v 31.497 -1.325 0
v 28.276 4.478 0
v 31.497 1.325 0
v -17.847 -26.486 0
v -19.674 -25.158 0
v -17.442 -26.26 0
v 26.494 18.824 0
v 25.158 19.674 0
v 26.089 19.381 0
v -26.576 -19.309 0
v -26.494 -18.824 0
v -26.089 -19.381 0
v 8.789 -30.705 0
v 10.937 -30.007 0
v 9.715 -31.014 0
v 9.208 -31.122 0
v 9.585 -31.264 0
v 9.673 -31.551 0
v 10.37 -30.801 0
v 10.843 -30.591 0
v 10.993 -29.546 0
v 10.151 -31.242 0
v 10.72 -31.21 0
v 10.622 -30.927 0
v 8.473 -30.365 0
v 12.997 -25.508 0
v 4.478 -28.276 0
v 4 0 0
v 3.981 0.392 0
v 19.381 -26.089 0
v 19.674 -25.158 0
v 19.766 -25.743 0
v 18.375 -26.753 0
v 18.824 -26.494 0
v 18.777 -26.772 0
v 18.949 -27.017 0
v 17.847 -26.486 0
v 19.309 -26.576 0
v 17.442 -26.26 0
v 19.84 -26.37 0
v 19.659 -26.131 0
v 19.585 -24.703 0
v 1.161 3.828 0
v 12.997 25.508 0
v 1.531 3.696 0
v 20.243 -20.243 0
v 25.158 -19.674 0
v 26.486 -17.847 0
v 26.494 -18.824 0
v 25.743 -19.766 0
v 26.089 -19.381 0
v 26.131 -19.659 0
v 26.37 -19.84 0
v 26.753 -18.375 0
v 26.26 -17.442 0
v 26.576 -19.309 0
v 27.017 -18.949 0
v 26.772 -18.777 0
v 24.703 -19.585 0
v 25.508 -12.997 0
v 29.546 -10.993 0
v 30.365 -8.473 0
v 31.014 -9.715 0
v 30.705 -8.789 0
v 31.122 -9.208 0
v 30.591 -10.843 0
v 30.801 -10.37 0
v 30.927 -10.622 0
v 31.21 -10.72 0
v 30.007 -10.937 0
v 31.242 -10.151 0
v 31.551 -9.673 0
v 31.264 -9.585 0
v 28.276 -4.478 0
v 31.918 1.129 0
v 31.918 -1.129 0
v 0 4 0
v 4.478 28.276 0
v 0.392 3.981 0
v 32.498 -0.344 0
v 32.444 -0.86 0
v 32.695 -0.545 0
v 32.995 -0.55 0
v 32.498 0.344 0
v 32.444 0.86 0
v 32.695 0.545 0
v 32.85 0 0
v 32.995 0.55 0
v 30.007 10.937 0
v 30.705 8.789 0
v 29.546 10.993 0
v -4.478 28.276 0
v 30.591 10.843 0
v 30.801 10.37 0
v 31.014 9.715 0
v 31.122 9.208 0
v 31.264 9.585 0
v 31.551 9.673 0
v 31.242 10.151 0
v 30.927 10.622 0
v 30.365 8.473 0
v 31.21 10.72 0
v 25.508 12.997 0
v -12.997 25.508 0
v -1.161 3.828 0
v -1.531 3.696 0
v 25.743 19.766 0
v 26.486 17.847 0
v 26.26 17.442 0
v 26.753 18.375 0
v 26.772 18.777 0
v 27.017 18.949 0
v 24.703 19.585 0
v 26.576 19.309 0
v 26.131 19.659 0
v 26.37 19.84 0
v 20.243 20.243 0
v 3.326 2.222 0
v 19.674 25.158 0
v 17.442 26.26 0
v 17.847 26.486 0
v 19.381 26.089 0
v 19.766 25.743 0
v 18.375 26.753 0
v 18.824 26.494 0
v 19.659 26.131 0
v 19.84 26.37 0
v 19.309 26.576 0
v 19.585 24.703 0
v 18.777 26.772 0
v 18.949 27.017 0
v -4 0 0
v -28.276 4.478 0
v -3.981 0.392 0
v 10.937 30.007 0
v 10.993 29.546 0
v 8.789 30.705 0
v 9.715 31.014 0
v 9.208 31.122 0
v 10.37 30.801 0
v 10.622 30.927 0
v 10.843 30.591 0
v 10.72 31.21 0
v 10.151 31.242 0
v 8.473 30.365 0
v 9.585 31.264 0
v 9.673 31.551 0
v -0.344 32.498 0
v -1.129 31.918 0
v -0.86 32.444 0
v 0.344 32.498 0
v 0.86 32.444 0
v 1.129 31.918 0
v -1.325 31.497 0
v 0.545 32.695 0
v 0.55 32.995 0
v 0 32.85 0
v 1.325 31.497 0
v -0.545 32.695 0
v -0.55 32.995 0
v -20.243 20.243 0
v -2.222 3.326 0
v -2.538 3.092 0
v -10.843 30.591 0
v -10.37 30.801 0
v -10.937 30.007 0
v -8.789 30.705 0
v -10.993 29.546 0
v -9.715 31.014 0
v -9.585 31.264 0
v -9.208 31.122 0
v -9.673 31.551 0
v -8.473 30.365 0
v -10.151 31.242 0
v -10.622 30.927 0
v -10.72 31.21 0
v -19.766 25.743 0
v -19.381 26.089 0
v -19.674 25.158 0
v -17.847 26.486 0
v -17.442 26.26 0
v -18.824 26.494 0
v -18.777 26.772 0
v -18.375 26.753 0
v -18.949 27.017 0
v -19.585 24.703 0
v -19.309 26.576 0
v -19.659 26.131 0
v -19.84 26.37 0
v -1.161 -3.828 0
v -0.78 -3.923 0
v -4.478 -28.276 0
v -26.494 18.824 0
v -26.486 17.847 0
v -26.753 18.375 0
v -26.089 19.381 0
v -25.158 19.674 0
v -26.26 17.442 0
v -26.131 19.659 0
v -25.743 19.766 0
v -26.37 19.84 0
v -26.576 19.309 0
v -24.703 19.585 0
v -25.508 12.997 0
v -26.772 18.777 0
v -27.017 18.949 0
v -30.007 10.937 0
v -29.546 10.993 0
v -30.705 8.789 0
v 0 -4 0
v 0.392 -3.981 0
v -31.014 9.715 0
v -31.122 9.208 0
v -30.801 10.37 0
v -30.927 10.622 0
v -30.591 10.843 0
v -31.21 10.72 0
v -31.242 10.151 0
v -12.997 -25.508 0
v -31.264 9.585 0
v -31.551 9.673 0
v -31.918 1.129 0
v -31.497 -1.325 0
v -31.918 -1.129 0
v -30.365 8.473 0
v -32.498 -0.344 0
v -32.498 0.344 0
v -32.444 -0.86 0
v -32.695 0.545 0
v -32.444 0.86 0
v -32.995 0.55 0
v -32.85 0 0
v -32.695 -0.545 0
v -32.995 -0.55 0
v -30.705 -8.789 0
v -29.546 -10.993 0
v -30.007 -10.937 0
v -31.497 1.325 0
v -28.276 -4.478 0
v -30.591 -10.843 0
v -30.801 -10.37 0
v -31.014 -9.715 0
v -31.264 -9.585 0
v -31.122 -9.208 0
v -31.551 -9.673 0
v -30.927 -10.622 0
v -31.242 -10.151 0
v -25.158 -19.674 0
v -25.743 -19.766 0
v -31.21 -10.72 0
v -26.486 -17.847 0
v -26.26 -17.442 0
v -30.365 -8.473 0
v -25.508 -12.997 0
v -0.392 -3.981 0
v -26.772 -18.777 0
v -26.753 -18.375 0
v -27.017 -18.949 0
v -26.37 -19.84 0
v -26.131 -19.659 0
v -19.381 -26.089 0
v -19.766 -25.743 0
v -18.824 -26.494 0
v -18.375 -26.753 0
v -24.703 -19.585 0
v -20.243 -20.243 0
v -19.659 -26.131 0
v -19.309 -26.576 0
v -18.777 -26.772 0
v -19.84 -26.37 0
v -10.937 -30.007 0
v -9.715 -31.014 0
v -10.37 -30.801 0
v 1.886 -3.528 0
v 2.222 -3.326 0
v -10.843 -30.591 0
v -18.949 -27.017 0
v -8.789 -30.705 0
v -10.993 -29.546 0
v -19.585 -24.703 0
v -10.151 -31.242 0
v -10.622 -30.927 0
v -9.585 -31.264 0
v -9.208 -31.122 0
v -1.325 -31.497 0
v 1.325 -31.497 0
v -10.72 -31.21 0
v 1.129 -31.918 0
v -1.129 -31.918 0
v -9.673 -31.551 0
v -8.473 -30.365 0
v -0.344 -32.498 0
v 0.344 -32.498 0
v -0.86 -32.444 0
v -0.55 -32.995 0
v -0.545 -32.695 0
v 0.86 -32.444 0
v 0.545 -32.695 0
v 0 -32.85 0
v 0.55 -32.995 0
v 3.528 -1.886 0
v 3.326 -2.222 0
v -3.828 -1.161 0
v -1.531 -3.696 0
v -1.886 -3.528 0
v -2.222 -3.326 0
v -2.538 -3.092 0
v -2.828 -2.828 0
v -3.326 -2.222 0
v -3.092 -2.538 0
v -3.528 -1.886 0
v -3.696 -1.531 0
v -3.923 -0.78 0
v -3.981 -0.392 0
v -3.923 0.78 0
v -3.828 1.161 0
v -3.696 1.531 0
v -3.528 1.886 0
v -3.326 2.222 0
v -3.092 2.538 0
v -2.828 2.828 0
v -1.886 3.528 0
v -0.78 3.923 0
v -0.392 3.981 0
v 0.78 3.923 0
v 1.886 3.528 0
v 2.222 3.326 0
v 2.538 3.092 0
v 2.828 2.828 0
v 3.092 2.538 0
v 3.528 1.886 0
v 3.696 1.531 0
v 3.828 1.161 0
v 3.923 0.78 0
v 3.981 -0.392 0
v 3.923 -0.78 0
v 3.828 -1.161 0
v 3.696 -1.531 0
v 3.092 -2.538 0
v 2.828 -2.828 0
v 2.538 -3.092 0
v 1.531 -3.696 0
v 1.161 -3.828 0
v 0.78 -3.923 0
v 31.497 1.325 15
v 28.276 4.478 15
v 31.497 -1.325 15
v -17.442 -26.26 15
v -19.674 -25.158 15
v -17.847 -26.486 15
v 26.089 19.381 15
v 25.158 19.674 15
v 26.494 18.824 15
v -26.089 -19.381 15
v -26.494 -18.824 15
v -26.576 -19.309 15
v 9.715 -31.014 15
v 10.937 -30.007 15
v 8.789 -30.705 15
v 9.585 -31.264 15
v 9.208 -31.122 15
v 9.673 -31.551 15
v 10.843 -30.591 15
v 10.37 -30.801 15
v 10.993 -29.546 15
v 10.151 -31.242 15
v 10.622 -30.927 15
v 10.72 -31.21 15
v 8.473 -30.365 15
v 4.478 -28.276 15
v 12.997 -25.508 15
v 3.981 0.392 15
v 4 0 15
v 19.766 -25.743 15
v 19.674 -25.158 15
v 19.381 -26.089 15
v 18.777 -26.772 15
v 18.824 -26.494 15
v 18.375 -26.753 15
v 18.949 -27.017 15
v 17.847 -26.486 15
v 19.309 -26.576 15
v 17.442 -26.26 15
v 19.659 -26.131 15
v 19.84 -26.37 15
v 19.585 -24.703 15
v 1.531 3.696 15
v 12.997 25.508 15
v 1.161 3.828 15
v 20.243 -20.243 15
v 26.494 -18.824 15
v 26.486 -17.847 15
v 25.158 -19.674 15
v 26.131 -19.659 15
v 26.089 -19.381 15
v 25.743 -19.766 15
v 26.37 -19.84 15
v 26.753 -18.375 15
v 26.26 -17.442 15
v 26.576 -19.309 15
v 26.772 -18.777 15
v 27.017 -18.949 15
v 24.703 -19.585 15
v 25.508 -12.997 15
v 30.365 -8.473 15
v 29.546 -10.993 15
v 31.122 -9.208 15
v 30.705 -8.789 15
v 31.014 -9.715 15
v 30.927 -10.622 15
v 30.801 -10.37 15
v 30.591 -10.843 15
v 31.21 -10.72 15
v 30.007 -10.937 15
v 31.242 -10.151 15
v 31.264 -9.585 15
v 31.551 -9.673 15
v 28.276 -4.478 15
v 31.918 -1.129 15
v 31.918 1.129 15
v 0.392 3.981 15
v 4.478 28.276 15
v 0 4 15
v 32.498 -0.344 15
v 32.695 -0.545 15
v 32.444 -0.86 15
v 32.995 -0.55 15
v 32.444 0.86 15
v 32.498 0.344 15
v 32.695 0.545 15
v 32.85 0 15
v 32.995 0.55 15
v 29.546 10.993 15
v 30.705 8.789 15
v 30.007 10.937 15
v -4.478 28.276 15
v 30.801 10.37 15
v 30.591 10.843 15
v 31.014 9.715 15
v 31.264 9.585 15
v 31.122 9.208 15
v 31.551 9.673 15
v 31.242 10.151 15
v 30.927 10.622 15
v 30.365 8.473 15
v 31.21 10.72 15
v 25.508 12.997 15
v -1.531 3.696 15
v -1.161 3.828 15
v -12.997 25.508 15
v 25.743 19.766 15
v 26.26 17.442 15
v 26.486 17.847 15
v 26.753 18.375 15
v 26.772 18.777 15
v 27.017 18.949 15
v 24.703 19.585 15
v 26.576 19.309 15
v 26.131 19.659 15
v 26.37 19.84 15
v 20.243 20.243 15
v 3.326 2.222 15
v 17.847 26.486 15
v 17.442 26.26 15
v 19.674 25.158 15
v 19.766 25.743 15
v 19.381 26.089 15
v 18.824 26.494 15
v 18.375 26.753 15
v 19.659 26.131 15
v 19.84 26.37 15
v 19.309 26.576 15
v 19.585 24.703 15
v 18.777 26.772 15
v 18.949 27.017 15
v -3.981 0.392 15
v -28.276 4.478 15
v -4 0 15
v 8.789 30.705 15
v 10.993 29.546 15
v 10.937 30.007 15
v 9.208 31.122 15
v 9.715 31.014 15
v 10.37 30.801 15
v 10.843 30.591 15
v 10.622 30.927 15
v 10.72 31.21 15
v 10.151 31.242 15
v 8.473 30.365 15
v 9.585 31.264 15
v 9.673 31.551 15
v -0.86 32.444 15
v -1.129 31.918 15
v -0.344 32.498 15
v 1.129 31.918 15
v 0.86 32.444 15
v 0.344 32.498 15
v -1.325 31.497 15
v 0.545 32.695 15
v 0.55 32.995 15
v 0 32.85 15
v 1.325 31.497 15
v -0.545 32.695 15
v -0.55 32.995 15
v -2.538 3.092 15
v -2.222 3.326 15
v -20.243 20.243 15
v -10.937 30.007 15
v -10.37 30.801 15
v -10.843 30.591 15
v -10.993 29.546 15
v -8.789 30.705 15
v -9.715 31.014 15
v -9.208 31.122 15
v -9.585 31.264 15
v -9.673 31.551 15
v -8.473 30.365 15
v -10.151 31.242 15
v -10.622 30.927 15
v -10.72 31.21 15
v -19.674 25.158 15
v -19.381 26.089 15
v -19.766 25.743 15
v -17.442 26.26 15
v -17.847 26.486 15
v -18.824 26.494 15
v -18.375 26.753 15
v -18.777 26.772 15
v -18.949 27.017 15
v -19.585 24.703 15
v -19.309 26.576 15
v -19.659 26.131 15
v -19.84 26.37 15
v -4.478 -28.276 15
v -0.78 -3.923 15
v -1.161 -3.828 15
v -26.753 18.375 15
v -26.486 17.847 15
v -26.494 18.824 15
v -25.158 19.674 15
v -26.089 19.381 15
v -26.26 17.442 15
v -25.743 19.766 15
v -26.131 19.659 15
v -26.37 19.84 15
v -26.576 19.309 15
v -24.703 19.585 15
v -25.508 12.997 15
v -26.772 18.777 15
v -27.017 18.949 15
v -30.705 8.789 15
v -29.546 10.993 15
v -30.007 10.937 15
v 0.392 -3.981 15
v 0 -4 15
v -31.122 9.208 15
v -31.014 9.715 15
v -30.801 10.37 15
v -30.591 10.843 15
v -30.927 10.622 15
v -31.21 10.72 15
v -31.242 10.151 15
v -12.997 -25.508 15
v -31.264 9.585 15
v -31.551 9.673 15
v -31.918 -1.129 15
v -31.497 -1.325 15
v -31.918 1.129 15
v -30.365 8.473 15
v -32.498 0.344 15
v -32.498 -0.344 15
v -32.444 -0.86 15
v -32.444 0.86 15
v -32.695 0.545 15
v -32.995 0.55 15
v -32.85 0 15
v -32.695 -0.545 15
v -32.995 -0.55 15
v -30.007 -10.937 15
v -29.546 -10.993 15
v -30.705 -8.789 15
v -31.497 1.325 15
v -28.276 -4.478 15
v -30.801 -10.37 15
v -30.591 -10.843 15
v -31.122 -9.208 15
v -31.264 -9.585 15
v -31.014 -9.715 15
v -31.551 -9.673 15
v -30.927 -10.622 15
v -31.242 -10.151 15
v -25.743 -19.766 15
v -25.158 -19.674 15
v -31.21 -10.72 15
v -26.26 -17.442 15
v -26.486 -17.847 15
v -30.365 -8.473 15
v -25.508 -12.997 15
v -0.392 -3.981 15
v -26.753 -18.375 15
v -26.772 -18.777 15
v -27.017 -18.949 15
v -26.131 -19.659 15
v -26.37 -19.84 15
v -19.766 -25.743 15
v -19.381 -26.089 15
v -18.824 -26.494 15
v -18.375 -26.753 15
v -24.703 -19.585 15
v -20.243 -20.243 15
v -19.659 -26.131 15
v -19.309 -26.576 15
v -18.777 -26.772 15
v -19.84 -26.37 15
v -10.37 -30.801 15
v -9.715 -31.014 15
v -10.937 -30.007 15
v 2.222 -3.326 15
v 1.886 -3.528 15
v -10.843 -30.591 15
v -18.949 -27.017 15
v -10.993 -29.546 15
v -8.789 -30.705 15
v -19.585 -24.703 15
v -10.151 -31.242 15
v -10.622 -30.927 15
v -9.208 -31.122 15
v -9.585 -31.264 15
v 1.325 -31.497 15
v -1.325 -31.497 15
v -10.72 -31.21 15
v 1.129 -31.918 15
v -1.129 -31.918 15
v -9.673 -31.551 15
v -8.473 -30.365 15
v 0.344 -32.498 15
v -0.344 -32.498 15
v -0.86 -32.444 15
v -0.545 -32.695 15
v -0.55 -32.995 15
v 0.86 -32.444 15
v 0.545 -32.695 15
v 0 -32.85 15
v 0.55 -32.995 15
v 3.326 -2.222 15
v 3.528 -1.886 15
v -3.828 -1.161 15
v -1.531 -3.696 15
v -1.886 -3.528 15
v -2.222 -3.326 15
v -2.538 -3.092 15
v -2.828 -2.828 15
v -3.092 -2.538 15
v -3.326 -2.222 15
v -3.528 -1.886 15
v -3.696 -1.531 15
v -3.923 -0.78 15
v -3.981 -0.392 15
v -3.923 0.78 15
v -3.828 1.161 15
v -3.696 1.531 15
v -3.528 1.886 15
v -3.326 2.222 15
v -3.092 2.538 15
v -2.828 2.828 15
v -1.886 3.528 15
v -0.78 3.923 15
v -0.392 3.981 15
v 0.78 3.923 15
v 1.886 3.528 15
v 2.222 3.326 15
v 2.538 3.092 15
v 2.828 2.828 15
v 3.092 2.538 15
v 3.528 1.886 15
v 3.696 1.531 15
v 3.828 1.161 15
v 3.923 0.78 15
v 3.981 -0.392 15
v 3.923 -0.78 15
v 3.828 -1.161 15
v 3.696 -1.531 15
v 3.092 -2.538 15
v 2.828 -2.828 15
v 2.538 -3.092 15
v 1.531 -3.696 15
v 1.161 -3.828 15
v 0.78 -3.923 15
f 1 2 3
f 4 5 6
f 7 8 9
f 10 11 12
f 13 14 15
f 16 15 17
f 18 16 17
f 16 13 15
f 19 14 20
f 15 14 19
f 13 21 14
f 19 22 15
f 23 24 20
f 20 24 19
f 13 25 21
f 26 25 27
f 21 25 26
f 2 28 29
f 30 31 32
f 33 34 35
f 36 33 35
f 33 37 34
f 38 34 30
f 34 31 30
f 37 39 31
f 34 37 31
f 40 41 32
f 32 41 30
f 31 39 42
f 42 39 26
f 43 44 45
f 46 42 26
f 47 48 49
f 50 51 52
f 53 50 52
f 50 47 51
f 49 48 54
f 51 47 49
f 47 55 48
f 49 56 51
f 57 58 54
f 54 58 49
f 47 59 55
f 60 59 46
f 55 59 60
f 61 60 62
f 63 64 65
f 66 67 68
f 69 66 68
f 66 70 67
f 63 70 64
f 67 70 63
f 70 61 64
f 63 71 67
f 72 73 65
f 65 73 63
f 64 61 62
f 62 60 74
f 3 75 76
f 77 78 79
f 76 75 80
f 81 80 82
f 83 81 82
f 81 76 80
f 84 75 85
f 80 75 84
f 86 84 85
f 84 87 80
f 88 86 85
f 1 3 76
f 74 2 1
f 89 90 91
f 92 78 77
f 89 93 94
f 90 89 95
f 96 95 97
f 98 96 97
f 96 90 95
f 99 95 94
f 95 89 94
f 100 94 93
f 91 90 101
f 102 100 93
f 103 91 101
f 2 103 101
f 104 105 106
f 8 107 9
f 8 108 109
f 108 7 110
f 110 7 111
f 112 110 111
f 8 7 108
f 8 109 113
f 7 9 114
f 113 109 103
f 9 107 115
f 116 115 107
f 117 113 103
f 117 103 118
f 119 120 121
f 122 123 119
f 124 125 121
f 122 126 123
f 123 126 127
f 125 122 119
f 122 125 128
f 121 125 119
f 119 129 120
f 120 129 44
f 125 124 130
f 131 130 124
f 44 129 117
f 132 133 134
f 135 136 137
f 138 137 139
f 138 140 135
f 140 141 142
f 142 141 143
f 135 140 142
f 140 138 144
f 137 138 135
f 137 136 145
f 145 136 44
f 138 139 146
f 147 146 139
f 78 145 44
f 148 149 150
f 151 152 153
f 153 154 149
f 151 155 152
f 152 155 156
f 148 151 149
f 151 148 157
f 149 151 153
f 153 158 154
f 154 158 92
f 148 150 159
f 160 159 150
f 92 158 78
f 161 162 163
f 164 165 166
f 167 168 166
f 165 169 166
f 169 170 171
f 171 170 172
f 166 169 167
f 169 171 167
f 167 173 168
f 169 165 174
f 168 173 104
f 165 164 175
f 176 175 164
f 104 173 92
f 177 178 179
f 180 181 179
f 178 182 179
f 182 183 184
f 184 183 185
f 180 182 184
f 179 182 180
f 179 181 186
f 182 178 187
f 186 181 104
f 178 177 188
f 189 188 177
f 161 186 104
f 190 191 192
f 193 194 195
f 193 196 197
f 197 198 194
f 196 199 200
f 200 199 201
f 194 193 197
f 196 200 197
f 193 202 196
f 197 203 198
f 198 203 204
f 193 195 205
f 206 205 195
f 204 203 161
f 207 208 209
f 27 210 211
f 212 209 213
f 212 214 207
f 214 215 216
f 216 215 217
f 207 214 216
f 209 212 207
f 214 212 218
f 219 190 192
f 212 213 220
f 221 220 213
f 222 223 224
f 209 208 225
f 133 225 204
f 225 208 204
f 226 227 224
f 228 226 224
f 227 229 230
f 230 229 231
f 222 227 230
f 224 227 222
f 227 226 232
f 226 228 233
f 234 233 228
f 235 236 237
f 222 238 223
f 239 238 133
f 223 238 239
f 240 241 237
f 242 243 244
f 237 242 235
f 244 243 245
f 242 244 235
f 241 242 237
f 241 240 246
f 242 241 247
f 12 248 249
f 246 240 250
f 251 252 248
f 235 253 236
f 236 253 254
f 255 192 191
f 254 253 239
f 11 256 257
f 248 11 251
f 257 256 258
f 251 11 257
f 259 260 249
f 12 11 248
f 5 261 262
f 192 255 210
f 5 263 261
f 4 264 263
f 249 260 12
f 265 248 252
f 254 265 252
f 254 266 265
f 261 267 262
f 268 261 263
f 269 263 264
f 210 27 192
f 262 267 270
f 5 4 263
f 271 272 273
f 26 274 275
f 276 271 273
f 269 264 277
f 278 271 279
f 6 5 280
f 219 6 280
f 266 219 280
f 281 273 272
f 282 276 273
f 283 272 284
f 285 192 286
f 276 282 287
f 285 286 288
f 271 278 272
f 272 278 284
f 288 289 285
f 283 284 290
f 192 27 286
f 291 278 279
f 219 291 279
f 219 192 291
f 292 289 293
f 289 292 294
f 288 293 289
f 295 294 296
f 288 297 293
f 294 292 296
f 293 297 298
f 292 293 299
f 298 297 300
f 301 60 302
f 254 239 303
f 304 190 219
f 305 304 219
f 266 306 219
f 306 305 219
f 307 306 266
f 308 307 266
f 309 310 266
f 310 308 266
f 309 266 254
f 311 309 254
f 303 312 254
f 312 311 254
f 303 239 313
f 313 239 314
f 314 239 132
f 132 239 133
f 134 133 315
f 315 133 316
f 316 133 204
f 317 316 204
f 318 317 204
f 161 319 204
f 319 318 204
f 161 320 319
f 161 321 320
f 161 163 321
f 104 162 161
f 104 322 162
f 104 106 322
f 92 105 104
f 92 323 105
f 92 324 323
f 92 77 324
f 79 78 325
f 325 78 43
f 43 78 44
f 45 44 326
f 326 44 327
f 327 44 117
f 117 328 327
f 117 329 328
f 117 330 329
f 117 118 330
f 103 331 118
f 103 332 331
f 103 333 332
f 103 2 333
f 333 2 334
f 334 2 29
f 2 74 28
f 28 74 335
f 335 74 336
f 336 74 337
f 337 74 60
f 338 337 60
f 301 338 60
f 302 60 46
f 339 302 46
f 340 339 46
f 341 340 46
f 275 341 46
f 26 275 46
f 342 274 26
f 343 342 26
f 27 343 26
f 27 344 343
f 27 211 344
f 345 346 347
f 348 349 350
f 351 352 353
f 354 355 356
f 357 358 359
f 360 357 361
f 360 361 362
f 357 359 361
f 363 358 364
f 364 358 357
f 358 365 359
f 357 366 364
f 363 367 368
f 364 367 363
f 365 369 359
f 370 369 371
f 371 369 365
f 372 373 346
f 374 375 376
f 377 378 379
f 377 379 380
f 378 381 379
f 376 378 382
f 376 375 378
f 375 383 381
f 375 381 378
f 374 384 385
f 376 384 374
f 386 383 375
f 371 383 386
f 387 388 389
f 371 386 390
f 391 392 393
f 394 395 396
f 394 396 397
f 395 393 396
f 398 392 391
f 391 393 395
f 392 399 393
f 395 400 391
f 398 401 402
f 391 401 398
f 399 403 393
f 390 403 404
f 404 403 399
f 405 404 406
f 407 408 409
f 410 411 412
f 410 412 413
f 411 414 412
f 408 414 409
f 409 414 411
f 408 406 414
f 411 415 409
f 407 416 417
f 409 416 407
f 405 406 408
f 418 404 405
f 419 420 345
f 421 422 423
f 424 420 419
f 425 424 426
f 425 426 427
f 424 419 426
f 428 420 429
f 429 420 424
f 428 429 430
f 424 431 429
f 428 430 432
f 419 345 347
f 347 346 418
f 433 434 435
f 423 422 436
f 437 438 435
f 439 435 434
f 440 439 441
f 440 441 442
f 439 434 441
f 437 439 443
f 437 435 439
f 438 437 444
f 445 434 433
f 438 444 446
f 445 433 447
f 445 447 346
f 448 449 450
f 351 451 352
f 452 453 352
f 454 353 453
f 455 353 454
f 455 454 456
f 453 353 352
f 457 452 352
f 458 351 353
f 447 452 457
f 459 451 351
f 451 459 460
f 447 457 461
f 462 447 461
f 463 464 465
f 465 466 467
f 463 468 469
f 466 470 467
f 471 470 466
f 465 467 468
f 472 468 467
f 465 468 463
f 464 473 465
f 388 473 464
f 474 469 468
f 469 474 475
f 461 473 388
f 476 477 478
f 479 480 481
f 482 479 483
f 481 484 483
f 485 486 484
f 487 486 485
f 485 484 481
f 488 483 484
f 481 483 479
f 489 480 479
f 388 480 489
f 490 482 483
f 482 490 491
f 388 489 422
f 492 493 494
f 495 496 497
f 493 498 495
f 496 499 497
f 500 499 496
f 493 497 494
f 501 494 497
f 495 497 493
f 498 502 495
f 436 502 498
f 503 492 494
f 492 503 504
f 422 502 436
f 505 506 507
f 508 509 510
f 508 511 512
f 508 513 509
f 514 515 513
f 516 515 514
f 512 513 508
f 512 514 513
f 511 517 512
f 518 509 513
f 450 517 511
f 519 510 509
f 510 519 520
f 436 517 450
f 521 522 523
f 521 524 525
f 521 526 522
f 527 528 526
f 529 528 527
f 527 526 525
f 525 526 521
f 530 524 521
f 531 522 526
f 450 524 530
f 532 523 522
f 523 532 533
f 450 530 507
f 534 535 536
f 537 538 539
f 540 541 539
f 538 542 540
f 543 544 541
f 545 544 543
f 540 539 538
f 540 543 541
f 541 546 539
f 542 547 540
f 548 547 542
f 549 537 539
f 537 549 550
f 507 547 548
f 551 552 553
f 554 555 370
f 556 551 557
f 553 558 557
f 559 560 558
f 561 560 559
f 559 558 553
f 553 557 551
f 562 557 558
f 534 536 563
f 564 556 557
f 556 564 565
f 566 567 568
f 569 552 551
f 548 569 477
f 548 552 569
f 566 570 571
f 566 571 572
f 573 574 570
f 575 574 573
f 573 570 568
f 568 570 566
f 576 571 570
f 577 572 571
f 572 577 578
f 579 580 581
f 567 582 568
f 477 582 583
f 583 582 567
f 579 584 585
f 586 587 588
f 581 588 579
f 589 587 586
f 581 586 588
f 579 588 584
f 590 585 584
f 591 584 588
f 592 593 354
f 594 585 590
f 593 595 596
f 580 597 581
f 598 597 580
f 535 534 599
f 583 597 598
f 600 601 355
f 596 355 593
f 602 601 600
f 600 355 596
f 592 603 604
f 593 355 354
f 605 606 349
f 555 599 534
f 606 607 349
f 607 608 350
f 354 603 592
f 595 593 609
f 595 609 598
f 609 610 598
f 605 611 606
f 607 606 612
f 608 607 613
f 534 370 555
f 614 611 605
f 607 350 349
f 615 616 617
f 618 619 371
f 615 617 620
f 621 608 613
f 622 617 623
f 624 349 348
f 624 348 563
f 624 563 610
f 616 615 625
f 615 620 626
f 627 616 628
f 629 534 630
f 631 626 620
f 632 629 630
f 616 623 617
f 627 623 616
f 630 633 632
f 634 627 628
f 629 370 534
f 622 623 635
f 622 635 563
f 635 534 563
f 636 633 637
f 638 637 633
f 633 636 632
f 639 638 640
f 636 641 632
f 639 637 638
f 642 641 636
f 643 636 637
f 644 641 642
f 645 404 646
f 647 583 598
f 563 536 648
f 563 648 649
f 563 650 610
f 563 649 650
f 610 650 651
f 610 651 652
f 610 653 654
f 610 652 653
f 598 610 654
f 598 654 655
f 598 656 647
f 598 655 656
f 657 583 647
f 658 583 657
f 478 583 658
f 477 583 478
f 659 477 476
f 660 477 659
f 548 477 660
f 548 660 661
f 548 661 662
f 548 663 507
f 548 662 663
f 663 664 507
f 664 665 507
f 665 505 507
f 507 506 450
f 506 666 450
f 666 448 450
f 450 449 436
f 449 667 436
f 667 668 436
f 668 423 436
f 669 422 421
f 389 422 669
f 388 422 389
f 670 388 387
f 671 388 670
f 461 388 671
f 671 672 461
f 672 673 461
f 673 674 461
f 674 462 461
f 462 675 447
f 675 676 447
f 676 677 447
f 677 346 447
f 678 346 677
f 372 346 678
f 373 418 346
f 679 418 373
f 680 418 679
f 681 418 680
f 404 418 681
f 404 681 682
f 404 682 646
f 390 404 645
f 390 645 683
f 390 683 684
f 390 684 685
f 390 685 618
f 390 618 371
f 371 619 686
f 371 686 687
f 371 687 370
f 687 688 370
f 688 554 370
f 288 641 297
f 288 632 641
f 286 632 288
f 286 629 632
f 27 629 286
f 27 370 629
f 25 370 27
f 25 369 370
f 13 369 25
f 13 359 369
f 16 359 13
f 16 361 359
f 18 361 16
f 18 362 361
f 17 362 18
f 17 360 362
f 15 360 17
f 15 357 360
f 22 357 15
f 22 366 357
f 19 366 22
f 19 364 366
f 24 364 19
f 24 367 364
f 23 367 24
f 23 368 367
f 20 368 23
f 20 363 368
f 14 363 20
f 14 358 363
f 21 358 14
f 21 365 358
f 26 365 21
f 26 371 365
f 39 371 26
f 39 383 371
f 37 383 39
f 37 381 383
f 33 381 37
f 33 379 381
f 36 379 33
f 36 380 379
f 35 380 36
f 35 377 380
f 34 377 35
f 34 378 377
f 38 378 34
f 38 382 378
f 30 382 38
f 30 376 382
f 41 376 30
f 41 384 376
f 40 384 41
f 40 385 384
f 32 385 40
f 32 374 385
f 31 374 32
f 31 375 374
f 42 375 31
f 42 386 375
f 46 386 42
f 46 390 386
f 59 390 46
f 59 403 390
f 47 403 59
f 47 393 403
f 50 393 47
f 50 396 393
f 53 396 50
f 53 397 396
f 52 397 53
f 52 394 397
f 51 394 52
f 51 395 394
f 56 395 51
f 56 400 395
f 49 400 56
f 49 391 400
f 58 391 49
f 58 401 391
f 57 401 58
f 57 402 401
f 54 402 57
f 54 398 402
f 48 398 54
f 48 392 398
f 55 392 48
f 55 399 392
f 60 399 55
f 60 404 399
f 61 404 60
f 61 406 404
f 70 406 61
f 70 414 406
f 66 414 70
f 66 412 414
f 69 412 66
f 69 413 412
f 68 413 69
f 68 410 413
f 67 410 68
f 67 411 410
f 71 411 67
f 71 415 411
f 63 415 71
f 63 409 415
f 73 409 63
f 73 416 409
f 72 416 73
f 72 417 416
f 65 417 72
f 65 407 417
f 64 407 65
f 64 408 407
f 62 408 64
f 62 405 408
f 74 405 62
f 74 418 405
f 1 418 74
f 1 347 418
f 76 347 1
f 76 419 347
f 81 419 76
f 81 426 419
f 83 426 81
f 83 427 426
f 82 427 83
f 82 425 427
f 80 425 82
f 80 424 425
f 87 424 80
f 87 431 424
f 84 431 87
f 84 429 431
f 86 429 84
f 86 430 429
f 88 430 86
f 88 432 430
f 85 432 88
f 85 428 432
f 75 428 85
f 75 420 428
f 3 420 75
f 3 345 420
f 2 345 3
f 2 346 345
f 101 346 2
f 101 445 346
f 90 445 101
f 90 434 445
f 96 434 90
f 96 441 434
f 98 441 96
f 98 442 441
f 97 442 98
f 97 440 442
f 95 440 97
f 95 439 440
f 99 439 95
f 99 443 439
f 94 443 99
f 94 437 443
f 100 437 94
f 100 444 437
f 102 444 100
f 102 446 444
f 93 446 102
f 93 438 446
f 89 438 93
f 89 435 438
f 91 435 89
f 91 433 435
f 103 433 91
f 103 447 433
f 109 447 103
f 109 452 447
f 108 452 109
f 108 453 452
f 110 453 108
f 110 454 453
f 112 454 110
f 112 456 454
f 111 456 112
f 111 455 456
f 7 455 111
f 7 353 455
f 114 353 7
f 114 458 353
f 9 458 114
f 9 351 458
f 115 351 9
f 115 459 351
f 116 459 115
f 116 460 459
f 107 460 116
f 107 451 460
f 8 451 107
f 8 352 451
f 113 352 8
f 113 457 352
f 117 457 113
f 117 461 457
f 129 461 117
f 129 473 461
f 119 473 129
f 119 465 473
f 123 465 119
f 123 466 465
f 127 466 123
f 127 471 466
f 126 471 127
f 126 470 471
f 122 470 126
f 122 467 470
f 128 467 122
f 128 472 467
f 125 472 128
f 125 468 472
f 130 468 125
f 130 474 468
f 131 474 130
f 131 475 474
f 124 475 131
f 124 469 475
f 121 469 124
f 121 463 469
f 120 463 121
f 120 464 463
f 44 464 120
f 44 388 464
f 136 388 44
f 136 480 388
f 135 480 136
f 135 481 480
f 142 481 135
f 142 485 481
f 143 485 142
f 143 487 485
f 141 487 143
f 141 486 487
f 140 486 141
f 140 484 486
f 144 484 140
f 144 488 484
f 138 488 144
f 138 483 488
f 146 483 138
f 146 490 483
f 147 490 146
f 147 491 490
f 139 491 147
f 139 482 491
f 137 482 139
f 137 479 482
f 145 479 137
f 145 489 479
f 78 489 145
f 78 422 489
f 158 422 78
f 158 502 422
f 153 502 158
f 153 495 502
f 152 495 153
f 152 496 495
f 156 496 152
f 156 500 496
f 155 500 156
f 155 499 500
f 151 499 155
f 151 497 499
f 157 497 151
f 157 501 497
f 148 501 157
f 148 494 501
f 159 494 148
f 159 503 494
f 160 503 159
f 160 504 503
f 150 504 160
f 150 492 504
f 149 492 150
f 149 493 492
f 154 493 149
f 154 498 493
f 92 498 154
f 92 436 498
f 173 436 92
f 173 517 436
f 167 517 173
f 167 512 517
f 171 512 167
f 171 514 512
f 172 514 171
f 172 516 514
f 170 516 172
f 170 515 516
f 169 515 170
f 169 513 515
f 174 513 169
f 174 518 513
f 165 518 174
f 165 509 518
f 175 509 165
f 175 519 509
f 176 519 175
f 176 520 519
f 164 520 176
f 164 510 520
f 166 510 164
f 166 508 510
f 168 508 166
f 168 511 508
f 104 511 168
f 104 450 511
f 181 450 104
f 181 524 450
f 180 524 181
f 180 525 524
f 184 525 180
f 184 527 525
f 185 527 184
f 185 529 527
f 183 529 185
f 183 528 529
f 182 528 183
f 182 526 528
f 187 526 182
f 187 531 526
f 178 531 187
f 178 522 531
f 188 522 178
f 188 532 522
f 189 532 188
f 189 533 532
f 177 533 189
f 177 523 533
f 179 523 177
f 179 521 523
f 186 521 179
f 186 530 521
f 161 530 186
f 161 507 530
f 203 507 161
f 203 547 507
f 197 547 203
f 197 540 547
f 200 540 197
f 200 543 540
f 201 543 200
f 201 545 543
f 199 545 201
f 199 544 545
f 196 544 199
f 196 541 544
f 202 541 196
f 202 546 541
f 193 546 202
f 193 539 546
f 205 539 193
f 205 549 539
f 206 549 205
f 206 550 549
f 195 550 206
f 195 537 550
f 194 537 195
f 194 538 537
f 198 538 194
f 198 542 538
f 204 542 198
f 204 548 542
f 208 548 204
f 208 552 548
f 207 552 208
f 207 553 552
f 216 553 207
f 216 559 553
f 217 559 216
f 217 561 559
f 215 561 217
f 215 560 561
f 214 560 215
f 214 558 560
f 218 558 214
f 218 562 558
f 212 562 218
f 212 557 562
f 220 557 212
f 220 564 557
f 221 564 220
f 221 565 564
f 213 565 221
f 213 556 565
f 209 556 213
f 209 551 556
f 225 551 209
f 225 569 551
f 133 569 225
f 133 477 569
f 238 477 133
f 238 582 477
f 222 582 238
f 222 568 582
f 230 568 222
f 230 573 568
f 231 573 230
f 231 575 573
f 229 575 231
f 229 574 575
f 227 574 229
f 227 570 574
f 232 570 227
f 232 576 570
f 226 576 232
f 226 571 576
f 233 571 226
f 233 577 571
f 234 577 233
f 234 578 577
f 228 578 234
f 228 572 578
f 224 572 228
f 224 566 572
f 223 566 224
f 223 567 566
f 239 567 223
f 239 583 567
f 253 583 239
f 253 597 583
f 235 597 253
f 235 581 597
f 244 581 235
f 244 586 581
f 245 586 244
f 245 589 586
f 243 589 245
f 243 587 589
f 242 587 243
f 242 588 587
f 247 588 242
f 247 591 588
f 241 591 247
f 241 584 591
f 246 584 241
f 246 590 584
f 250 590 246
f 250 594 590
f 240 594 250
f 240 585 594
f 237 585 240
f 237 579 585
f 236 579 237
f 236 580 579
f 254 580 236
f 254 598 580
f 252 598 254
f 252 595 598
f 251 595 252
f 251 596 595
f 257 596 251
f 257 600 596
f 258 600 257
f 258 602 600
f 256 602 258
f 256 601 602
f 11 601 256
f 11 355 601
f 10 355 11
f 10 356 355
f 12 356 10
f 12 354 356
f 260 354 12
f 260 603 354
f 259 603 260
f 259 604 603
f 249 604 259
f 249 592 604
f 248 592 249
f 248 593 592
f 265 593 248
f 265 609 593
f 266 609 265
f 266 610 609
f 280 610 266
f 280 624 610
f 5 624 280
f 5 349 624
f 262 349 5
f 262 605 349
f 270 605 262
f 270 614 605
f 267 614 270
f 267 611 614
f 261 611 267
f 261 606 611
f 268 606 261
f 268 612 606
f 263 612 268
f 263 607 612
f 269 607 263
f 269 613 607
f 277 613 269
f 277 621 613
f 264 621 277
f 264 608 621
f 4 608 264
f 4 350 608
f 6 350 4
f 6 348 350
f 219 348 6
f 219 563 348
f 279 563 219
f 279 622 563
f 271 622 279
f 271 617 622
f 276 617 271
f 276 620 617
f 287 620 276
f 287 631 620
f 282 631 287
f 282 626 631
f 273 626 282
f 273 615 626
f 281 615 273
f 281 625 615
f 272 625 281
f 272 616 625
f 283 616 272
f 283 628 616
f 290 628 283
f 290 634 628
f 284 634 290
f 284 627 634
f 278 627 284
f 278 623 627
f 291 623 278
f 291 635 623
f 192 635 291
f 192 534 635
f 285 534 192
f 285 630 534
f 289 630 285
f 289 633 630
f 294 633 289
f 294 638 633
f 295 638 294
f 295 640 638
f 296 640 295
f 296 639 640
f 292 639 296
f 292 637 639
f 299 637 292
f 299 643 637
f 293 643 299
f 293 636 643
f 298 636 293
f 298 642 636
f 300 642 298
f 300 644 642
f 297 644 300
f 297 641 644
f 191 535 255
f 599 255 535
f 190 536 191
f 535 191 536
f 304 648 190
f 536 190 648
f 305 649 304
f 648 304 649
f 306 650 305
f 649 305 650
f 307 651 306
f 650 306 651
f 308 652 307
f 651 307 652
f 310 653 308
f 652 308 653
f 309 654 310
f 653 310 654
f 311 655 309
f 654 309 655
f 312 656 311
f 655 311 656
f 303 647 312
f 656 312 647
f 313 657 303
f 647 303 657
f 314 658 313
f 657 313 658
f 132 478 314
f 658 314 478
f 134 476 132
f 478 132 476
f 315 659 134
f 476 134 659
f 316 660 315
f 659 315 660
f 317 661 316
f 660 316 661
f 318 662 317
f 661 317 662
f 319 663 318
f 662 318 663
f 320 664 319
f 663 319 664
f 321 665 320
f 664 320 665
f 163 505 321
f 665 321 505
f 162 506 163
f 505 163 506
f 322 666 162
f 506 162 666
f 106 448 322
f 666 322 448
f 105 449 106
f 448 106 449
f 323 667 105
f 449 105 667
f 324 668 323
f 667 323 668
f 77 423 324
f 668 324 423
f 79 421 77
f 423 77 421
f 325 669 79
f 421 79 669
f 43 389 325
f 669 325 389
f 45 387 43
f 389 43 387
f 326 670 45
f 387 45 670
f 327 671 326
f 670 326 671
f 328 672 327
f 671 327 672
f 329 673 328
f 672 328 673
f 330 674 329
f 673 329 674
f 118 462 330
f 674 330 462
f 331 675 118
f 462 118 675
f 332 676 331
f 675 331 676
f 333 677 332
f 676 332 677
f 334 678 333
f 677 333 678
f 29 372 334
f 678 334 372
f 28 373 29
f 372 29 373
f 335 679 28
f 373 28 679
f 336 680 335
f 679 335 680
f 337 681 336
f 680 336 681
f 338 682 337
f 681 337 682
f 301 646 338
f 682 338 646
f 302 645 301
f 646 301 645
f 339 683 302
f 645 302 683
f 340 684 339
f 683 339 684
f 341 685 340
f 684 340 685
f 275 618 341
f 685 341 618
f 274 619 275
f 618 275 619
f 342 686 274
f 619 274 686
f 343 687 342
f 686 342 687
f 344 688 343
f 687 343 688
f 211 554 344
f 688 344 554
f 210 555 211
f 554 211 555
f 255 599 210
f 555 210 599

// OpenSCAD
/*
 * PARAMETRIC SPUR GEAR GENERATOR
 * ISO 21771 Compliant Involute Profile
 *
 * Author: Claude
 *
 * USAGE:
 *   spur_gear(m=2, teeth=24, thickness=10);
 *   spur_gear(m=3, teeth=20, thickness=15, bore=8, pressure_angle=20);
 *
 * All dimensions in millimeters.
 * Note: 'm' is used instead of 'module' (reserved keyword in OpenSCAD)
 */

$fn = 64;

// ═══════════════════════════════════════════════════════════════════════════
//                         EXAMPLE GEAR (uncomment to render)
// ═══════════════════════════════════════════════════════════════════════════

// Single gear
spur_gear(m=3, teeth=20, thickness=15, bore=8);

// Meshing pair (uncomment to see)
// gear_pair(m=2, teeth1=12, teeth2=36, thickness=10, spacing=0.2);

// ═══════════════════════════════════════════════════════════════════════════
//                         INVOLUTE MATH FUNCTIONS
// ═══════════════════════════════════════════════════════════════════════════

// Involute curve point at parameter t (radians)
function involute_point(base_r, t) = [
    base_r * (cos(t * 180/PI) + t * sin(t * 180/PI)),
    base_r * (sin(t * 180/PI) - t * cos(t * 180/PI))
];

// Parameter t where involute reaches radius r
function involute_t_at_r(base_r, r) =
    (r <= base_r) ? 0 : sqrt(pow(r/base_r, 2) - 1);

// Involute function: inv(α) = tan(α) - α
function involute_function(alpha_deg) =
    tan(alpha_deg) - alpha_deg * PI / 180;

// Polar angle of involute point at radius r
function involute_polar_angle(base_r, r) =
    let(t = involute_t_at_r(base_r, r))
    atan2(involute_point(base_r, t).y, involute_point(base_r, t).x);

// ═══════════════════════════════════════════════════════════════════════════
//                         GEAR DIMENSION CALCULATOR
// ═══════════════════════════════════════════════════════════════════════════

// Returns [pitch_r, base_r, tip_r, root_r, circular_pitch, tooth_thickness]
function gear_dimensions(mod, z, alpha=20) = [
    mod * z / 2,                              // pitch radius
    mod * z / 2 * cos(alpha),                 // base radius
    mod * z / 2 + mod,                        // tip radius (addendum = 1.0m)
    mod * z / 2 - 1.25 * mod,                 // root radius (dedendum = 1.25m)
    PI * mod,                                 // circular pitch
    PI * mod / 2                              // tooth thickness at pitch
];

// ═══════════════════════════════════════════════════════════════════════════
//                         SINGLE TOOTH PROFILE (2D)
// ═══════════════════════════════════════════════════════════════════════════

module gear_tooth_profile(mod, z, alpha=20, steps=16) {
    dims = gear_dimensions(mod, z, alpha);
    pitch_r = dims[0];
    base_r = dims[1];
    tip_r = dims[2];
    root_r = dims[3];

    // Angular pitch
    angular_pitch = 360 / z;

    // Tooth thickness angle at pitch circle
    tooth_thick = PI * mod / 2;
    tooth_angle = (tooth_thick / pitch_r) * 180 / PI;

    // Involute parameters
    t_base = 0;
    t_tip = involute_t_at_r(base_r, tip_r);

    // Generate right flank involute points
    right_flank = [
        for (i = [0 : steps])
            let(
                t = t_base + (t_tip - t_base) * i / steps,
                pt = involute_point(base_r, t),
                r = norm(pt),
                ang = atan2(pt.y, pt.x)
            )
            [r * cos(ang - tooth_angle/2), r * sin(ang - tooth_angle/2)]
    ];

    // Mirror for left flank
    left_flank = [
        for (i = [len(right_flank)-1 : -1 : 0])
            let(pt = right_flank[i])
            [-pt.x, pt.y]
    ];

    // Root fillet radius
    fillet_r = 0.25 * mod;

    // Root arc
    root_start = -atan2(right_flank[0].x, right_flank[0].y);
    root_end = atan2(left_flank[len(left_flank)-1].x, left_flank[len(left_flank)-1].y);

    root_arc = [
        for (a = [root_start : 3 : root_end])
            [root_r * sin(a), root_r * cos(a)]
    ];

    // Tip relief/chamfer
    chamfer = 0.1 * mod;
    tip_r_eff = tip_r - chamfer;

    tip_arc = [
        let(pt = right_flank[len(right_flank)-1])
            [tip_r_eff * pt.x / norm(pt), tip_r_eff * pt.y / norm(pt)],
        [0, tip_r - chamfer/2],
        let(pt = left_flank[0])
            [tip_r_eff * pt.x / norm(pt), tip_r_eff * pt.y / norm(pt)]
    ];

    // Combine all points
    polygon(concat(root_arc, right_flank, tip_arc, left_flank));
}

// ═══════════════════════════════════════════════════════════════════════════
//                         REFERENCE CIRCLES (2D)
// ═══════════════════════════════════════════════════════════════════════════

module gear_circles_2d(mod, z, alpha=20, line_w=0.3) {
    dims = gear_dimensions(mod, z, alpha);
    pitch_r = dims[0];
    base_r = dims[1];
    tip_r = dims[2];
    root_r = dims[3];

    // Pitch (green)
    color("green", 0.5) difference() {
        circle(r = pitch_r + line_w/2);
        circle(r = pitch_r - line_w/2);
    }

    // Base (blue)
    color("blue", 0.5) difference() {
        circle(r = base_r + line_w/2);
        circle(r = base_r - line_w/2);
    }

    // Root (red)
    color("red", 0.5) difference() {
        circle(r = root_r + line_w/2);
        circle(r = root_r - line_w/2);
    }

    // Tip (orange)
    color("orange", 0.5) difference() {
        circle(r = tip_r + line_w/2);
        circle(r = tip_r - line_w/2);
    }
}

// ═══════════════════════════════════════════════════════════════════════════
//                         MAIN SPUR GEAR MODULE
// ═══════════════════════════════════════════════════════════════════════════

/*
 * spur_gear - Creates a complete spur gear
 *
 * Parameters:
 *   m              - Gear module (tooth size), default 2mm
 *   teeth          - Number of teeth, default 20
 *   thickness      - Face width, default 10mm
 *   bore           - Center hole diameter, default 0 (no hole)
 *   pressure_angle - Pressure angle in degrees, default 20
 *   hub_dia        - Hub diameter, default 0 (no hub)
 *   hub_height     - Hub height (extends beyond gear), default 0
 *   keyway_width   - Keyway width, default 0 (no keyway)
 *   keyway_depth   - Keyway depth, default keyway_width/2
 *   show_circles   - Show reference circles, default false
 *   helix_angle    - Helix angle for helical gears, default 0
 */

module spur_gear(
    m = 2,
    teeth = 20,
    thickness = 10,
    bore = 0,
    pressure_angle = 20,
    hub_dia = 0,
    hub_height = 0,
    keyway_width = 0,
    keyway_depth = 0,
    show_circles = false,
    helix_angle = 0,
    color_gear = [0.7, 0.55, 0.2]
) {
    mod = m;  // Use 'mod' internally
    z = teeth;
    alpha = pressure_angle;

    dims = gear_dimensions(mod, z, alpha);
    pitch_r = dims[0];
    base_r = dims[1];
    tip_r = dims[2];
    root_r = dims[3];

    actual_hub_dia = (hub_dia > 0) ? hub_dia : (bore > 0 ? bore * 1.8 : root_r * 0.6);
    actual_keyway_depth = (keyway_depth > 0) ? keyway_depth : keyway_width / 2;

    color(color_gear)
    difference() {
        union() {
            // Gear body with teeth
            linear_extrude(thickness, twist = helix_angle * thickness / pitch_r, convexity = 10) {
                difference() {
                    union() {
                        // Gear blank
                        circle(r = root_r);

                        // Teeth
                        for (i = [0 : z - 1]) {
                            rotate([0, 0, i * 360 / z])
                                gear_tooth_profile(mod, z, alpha);
                        }
                    }

                    // Bore (if specified)
                    if (bore > 0)
                        circle(d = bore);
                }
            }

            // Hub (if specified)
            if (hub_dia > 0 && hub_height > 0) {
                translate([0, 0, thickness])
                difference() {
                    cylinder(d = hub_dia, h = hub_height);
                    if (bore > 0)
                        cylinder(d = bore, h = hub_height + 1);
                }
            }
        }

        // Keyway (if specified)
        if (keyway_width > 0 && bore > 0) {
            translate([bore/2 - actual_keyway_depth/2, -keyway_width/2, -1])
                cube([actual_keyway_depth + 1, keyway_width, thickness + hub_height + 2]);
        }
    }

    // Reference circles (optional)
    if (show_circles) {
        translate([0, 0, thickness + 0.1])
        linear_extrude(0.5)
            gear_circles_2d(mod, z, alpha);
    }

    // Echo gear data
    echo("");
    echo("════════════════════════════════════════════");
    echo("  SPUR GEAR SPECIFICATIONS");
    echo("════════════════════════════════════════════");
    echo(str("Module: ", mod, " mm"));
    echo(str("Teeth: ", z));
    echo(str("Pressure angle: ", alpha, "°"));
    echo(str("Pitch diameter: ", pitch_r * 2, " mm"));
    echo(str("Base diameter: ", round(base_r * 200) / 100, " mm"));
    echo(str("Tip diameter: ", tip_r * 2, " mm"));
    echo(str("Root diameter: ", round(root_r * 200) / 100, " mm"));
    echo(str("Circular pitch: ", round(PI * mod * 100) / 100, " mm"));
    echo(str("Face width: ", thickness, " mm"));
    if (bore > 0) echo(str("Bore: ", bore, " mm"));
    echo("════════════════════════════════════════════");
}

// ═══════════════════════════════════════════════════════════════════════════
//                         GEAR PAIR MODULE
// ═══════════════════════════════════════════════════════════════════════════

/*
 * gear_pair - Creates two meshing gears
 *
 * Parameters:
 *   m         - Gear module (same for both)
 *   teeth1    - Teeth on first gear (driver)
 *   teeth2    - Teeth on second gear (driven)
 *   thickness - Face width
 *   spacing   - Additional center distance (backlash), default 0.1mm
 *   angle1    - Rotation of first gear, default 0
 */

module gear_pair(
    m = 2,
    teeth1 = 12,
    teeth2 = 36,
    thickness = 10,
    spacing = 0.1,
    angle1 = 0,
    bore1 = 0,
    bore2 = 0,
    pressure_angle = 20
) {
    mod = m;

    pitch_r1 = mod * teeth1 / 2;
    pitch_r2 = mod * teeth2 / 2;
    center_dist = pitch_r1 + pitch_r2 + spacing;

    // Gear ratio
    ratio = teeth2 / teeth1;
    angle2 = -angle1 / ratio + 180 / teeth2;  // Phase for mesh

    // First gear (at origin)
    rotate([0, 0, angle1])
        spur_gear(m=mod, teeth=teeth1, thickness=thickness,
                  bore=bore1, pressure_angle=pressure_angle,
                  color_gear=[0.7, 0.55, 0.2]);

    // Second gear (offset)
    translate([center_dist, 0, 0])
    rotate([0, 0, angle2])
        spur_gear(m=mod, teeth=teeth2, thickness=thickness,
                  bore=bore2, pressure_angle=pressure_angle,
                  color_gear=[0.5, 0.5, 0.55]);

    echo("");
    echo("════════════════════════════════════════════");
    echo("  GEAR PAIR SPECIFICATIONS");
    echo("════════════════════════════════════════════");
    echo(str("Center distance: ", center_dist, " mm"));
    echo(str("Gear ratio: ", ratio, ":1"));
    echo(str("Speed ratio: 1:", ratio));
    echo("════════════════════════════════════════════");
}

// ═══════════════════════════════════════════════════════════════════════════
//                         RACK MODULE
// ═══════════════════════════════════════════════════════════════════════════

/*
 * gear_rack - Creates a straight rack that meshes with spur gears
 *
 * Parameters:
 *   m         - Must match meshing gear module
 *   length    - Rack length
 *   height    - Total rack height (teeth + base)
 *   thickness - Rack width
 */

module gear_rack(
    m = 2,
    length = 100,
    height = 15,
    thickness = 10,
    pressure_angle = 20
) {
    mod = m;
    alpha = pressure_angle;

    addendum = mod;
    dedendum = 1.25 * mod;
    tooth_height = addendum + dedendum;
    pitch = PI * mod;
    num_teeth = floor(length / pitch);

    // Tooth profile
    half_width = pitch / 4;
    root_half = half_width - addendum * tan(alpha);
    tip_half = half_width + dedendum * tan(alpha);
    fillet = 0.25 * mod;

    color([0.5, 0.5, 0.55])
    translate([0, 0, 0])
    rotate([90, 0, 0])
    linear_extrude(thickness, center=true) {
        // Base
        translate([-length/2, 0])
            square([length, height - tooth_height]);

        // Teeth
        for (i = [0 : num_teeth - 1]) {
            x_pos = -length/2 + pitch/2 + i * pitch;
            if (x_pos + pitch/2 < length/2) {
                translate([x_pos, height - tooth_height])
                polygon([
                    [-root_half - fillet*0.3, 0],
                    [-root_half, fillet*0.3],
                    [-tip_half + 0.1*mod, tooth_height - 0.1*mod],
                    [-tip_half + 0.05*mod, tooth_height],
                    [tip_half - 0.05*mod, tooth_height],
                    [tip_half - 0.1*mod, tooth_height - 0.1*mod],
                    [root_half, fillet*0.3],
                    [root_half + fillet*0.3, 0]
                ]);
            }
        }
    }

    echo("");
    echo("════════════════════════════════════════════");
    echo("  RACK SPECIFICATIONS");
    echo("════════════════════════════════════════════");
    echo(str("Module: ", mod, " mm"));
    echo(str("Length: ", length, " mm"));
    echo(str("Teeth: ", num_teeth));
    echo(str("Pitch: ", round(pitch * 100) / 100, " mm"));
    echo("════════════════════════════════════════════");
}

// ═══════════════════════════════════════════════════════════════════════════
//                         INTERNAL GEAR MODULE
// ═══════════════════════════════════════════════════════════════════════════

/*
 * internal_gear - Creates an internal (ring) gear
 *
 * Parameters:
 *   m           - Gear module
 *   teeth       - Number of teeth
 *   thickness   - Face width
 *   rim_width   - Thickness of outer rim
 */

module internal_gear(
    m = 2,
    teeth = 40,
    thickness = 10,
    rim_width = 5,
    pressure_angle = 20
) {
    mod = m;
    z = teeth;
    alpha = pressure_angle;

    dims = gear_dimensions(mod, z, alpha);
    pitch_r = dims[0];
    tip_r = dims[2];
    root_r = dims[3];

    // For internal gear, tip and root are swapped
    inner_tip_r = pitch_r - mod;        // Teeth point inward
    inner_root_r = pitch_r + 1.25*mod;  // Root is larger
    outer_r = inner_root_r + rim_width;

    color([0.6, 0.6, 0.65])
    linear_extrude(thickness) {
        difference() {
            // Outer ring
            circle(r = outer_r);

            // Inner profile with teeth
            circle(r = inner_root_r);

            // Cut teeth (pointing inward)
            for (i = [0 : z - 1]) {
                rotate([0, 0, i * 360 / z])
                    scale([-1, 1])  // Mirror for internal
                    gear_tooth_profile(mod, z, alpha);
            }
        }
    }

    echo("");
    echo("════════════════════════════════════════════");
    echo("  INTERNAL GEAR SPECIFICATIONS");
    echo("════════════════════════════════════════════");
    echo(str("Module: ", mod, " mm"));
    echo(str("Teeth: ", z));
    echo(str("Pitch diameter: ", pitch_r * 2, " mm"));
    echo(str("Inner tip diameter: ", inner_tip_r * 2, " mm"));
    echo(str("Outer diameter: ", outer_r * 2, " mm"));
    echo("════════════════════════════════════════════");
}
